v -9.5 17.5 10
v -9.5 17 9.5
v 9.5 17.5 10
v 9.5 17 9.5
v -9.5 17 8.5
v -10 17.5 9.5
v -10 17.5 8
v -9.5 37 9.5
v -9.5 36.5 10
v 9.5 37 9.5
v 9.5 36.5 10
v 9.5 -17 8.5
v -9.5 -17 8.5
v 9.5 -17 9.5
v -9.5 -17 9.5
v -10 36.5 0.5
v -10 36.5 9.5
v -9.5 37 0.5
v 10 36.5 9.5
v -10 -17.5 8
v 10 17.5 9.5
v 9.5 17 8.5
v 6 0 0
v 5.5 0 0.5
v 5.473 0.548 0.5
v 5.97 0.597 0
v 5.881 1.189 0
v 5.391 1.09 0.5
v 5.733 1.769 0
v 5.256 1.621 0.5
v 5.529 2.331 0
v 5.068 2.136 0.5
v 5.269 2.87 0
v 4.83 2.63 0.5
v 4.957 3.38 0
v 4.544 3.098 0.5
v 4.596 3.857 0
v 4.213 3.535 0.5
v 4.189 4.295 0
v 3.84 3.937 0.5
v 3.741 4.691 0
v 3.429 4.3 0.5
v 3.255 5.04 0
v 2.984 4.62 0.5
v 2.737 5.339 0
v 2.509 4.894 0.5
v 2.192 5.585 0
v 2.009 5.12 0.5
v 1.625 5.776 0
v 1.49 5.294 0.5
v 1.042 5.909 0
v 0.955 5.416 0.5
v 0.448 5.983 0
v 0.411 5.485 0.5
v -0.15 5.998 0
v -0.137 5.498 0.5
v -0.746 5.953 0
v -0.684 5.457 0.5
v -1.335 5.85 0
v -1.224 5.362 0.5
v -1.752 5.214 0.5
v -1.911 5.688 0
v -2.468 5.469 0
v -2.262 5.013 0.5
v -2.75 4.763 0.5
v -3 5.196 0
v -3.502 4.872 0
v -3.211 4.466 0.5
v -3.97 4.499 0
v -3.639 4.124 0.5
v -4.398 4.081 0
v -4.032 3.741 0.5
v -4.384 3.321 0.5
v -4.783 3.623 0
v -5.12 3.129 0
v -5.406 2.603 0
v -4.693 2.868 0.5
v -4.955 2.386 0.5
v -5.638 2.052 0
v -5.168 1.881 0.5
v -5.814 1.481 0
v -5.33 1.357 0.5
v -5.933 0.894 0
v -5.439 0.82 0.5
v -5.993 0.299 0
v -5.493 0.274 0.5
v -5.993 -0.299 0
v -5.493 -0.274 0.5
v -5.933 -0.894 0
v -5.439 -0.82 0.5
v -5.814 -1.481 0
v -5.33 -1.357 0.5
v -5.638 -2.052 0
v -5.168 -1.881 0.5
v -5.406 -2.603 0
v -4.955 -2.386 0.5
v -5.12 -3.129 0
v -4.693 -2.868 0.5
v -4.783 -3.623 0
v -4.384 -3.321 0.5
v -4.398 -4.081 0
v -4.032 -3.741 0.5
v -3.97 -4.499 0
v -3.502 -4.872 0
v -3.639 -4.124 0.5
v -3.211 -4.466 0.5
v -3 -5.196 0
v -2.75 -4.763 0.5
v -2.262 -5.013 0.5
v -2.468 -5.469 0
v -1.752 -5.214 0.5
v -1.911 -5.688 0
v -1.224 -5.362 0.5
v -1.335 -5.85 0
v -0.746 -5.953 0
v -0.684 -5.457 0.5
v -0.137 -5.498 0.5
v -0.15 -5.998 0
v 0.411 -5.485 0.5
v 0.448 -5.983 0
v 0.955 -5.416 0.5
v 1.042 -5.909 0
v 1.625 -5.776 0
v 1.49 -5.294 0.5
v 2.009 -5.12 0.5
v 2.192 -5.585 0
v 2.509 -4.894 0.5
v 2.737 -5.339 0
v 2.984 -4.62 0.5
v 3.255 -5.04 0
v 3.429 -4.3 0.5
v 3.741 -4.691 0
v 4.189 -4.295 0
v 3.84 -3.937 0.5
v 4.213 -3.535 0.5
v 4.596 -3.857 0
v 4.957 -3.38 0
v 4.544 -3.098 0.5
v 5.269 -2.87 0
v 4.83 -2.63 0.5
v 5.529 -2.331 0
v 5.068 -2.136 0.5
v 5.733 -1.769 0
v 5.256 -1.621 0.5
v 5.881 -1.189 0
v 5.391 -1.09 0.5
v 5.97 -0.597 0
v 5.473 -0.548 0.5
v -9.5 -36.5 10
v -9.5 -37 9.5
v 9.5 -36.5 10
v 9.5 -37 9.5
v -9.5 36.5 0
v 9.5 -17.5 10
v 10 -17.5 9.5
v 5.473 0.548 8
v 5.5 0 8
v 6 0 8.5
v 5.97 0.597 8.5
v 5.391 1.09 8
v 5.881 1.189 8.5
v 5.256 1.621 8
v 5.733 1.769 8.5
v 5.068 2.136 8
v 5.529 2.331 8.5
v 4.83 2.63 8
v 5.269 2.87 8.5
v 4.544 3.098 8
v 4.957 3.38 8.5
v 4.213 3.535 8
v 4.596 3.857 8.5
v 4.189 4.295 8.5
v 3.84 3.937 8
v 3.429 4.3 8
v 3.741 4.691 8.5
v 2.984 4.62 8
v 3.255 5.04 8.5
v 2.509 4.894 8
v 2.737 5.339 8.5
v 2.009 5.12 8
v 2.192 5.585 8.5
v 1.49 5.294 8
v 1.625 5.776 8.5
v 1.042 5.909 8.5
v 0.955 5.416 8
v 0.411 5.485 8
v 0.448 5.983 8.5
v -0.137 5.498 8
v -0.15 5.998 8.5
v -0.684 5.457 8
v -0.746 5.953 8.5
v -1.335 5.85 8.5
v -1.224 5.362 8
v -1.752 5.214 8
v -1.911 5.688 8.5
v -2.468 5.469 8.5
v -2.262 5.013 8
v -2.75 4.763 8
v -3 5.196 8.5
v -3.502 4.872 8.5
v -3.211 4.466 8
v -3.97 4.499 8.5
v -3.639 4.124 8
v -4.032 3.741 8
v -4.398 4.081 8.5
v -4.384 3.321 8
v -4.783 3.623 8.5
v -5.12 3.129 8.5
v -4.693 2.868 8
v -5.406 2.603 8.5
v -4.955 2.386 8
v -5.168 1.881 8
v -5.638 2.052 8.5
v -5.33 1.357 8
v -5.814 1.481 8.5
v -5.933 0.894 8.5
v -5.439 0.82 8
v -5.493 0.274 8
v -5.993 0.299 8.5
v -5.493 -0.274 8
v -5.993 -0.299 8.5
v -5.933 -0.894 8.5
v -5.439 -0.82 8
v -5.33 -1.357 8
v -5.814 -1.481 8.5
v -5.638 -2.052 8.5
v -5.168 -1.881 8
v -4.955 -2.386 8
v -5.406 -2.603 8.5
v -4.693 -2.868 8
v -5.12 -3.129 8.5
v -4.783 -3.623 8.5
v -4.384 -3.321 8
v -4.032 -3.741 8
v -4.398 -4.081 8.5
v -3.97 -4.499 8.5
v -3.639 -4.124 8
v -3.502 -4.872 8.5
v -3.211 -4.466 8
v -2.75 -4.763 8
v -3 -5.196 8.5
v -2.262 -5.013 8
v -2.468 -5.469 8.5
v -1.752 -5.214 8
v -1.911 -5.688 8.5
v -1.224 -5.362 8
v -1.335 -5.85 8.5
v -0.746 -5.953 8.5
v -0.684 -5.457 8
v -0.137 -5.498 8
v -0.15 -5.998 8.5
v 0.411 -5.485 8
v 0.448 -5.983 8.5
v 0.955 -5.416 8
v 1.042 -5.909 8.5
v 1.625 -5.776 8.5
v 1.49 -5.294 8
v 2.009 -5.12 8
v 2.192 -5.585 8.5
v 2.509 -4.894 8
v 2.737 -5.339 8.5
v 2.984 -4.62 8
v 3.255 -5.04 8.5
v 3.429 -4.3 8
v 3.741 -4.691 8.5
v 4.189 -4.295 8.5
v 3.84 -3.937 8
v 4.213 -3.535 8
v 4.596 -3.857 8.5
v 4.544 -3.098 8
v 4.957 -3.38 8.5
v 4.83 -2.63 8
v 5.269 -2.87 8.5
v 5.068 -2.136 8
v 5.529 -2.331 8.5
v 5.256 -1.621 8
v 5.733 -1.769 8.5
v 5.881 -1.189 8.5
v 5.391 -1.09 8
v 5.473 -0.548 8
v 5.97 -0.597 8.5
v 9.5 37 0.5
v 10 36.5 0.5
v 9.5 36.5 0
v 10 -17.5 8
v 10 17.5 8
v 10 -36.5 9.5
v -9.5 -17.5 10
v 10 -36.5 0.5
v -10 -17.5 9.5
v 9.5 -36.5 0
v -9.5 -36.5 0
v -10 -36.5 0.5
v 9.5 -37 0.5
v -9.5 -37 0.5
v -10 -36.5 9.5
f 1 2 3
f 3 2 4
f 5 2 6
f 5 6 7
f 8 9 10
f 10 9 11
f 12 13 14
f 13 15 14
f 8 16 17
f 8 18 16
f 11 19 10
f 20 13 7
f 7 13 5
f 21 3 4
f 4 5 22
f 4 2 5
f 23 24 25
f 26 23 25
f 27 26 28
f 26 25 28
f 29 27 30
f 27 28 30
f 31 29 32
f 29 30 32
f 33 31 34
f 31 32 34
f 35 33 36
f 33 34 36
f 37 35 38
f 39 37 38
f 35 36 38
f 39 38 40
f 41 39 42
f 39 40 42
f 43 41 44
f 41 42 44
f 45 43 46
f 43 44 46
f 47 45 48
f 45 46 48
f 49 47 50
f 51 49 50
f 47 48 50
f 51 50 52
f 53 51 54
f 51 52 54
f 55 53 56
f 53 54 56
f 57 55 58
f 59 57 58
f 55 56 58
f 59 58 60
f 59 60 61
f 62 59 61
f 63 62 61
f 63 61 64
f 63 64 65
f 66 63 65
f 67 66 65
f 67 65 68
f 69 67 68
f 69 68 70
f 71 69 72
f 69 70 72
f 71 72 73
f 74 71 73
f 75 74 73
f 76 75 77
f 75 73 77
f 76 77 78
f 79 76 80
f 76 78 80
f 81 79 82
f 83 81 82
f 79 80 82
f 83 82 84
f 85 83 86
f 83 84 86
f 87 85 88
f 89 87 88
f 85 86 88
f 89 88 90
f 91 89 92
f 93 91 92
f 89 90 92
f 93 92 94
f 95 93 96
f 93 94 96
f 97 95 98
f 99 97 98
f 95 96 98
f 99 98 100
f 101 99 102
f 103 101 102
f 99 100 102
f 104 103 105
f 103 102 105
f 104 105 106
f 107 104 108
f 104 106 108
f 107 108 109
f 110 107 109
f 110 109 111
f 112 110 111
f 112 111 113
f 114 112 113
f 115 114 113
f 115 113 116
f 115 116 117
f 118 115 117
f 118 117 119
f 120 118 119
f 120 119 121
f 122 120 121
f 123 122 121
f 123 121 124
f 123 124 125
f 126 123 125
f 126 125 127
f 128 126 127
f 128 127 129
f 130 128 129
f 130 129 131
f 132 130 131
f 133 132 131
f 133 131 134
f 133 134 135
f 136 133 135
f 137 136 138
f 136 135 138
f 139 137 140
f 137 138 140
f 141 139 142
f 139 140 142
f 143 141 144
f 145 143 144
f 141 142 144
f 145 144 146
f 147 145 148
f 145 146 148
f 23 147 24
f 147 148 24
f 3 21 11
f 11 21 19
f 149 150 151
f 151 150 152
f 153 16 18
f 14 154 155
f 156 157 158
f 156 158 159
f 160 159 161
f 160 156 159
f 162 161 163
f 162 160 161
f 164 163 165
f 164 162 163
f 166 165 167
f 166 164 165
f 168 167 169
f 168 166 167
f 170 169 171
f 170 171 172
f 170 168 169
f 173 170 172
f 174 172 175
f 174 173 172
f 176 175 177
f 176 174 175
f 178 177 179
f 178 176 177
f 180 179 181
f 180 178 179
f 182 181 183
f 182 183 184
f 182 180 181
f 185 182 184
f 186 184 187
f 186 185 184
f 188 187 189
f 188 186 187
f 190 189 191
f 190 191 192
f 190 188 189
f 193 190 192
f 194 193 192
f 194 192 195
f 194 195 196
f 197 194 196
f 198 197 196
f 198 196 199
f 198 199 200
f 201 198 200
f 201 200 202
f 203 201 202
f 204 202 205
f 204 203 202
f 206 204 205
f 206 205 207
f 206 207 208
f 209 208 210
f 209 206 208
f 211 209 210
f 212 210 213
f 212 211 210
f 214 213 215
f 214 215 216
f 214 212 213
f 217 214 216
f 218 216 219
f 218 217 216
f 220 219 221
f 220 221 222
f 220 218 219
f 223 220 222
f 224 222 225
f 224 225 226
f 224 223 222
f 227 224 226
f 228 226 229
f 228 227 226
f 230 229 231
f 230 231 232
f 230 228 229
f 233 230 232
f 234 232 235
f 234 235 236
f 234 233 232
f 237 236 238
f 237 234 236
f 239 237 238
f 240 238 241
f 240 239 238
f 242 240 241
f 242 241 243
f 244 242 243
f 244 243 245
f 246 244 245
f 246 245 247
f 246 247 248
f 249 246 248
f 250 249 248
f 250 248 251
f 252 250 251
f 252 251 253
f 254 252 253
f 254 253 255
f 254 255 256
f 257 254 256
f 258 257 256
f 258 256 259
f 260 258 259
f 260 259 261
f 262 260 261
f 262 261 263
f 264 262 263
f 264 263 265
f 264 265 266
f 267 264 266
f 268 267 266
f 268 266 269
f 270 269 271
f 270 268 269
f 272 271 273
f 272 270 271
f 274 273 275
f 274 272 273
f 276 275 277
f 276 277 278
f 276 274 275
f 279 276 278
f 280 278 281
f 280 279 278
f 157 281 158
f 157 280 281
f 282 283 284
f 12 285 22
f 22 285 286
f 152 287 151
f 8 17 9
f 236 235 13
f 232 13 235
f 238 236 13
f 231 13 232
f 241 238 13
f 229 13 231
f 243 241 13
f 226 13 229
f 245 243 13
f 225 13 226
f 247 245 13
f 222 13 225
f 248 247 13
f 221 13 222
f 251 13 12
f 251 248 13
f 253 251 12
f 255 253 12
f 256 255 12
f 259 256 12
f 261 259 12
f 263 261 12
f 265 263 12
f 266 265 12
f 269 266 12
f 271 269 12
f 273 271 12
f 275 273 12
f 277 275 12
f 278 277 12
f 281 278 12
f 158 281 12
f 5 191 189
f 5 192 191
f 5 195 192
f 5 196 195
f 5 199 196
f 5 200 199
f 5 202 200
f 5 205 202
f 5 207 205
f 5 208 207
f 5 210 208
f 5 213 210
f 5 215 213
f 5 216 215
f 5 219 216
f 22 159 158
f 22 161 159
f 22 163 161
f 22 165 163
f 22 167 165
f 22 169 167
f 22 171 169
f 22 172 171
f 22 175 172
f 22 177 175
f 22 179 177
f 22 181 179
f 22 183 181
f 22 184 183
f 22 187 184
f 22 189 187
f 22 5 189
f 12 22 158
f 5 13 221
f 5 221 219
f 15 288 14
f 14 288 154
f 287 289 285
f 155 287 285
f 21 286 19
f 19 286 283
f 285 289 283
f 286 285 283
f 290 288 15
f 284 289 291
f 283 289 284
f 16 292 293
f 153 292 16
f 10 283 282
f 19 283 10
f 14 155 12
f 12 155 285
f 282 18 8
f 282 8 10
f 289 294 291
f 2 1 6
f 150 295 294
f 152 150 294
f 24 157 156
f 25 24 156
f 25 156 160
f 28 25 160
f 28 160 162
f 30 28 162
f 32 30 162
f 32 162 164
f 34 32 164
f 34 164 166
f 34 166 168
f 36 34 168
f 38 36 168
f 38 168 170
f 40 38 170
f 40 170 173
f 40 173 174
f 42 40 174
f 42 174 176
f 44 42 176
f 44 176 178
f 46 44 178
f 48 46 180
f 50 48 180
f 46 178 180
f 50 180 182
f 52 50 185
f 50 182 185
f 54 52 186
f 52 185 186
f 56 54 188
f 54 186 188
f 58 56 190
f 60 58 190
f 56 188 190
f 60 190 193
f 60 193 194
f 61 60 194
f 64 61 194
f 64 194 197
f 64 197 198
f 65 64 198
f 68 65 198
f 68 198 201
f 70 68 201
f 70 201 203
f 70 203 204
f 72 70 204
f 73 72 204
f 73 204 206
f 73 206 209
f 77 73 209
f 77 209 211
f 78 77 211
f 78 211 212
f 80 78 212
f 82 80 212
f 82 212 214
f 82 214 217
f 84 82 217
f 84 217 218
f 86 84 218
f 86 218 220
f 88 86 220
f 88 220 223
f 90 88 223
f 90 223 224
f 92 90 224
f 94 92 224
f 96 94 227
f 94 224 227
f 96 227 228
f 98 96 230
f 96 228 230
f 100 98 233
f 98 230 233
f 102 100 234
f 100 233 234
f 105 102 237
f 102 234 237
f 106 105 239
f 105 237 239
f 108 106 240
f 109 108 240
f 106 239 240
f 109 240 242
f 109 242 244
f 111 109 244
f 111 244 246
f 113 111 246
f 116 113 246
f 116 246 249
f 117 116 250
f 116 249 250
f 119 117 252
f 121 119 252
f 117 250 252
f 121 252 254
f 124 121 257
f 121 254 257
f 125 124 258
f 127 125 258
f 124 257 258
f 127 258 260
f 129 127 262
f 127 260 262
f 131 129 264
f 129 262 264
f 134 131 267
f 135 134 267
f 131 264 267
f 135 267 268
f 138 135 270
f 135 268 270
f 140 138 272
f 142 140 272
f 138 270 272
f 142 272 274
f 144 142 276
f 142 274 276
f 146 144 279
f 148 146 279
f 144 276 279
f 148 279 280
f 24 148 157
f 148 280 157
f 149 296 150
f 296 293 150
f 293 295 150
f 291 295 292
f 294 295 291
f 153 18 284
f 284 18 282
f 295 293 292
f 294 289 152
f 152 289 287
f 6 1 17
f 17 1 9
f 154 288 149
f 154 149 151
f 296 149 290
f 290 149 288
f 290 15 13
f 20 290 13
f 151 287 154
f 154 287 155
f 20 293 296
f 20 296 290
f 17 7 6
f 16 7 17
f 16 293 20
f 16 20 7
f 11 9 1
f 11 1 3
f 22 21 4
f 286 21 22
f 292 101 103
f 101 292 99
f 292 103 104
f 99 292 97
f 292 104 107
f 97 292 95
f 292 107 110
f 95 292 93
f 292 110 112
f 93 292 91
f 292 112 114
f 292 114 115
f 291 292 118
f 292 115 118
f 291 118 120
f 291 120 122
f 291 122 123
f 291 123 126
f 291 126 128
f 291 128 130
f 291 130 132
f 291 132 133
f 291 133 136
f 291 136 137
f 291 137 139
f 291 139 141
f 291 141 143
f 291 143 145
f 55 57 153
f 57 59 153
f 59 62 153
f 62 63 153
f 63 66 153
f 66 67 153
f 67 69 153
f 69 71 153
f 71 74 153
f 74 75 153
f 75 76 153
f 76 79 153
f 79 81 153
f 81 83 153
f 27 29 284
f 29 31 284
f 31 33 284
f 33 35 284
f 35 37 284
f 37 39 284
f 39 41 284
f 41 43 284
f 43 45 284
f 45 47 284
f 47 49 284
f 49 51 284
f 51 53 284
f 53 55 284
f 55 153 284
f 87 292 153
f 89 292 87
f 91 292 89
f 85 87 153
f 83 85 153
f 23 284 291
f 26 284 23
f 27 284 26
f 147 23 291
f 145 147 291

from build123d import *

# Parameters (mm, degrees)
F0_W     = 20
F0_H     = 74
F1_DEPTH = 10
F2_W     = 20
F2_H     = 34
F3_DEPTH = 1.5
F4_R     = 5.5
F5_DEPTH = 8.501
F6_SIZE  = 0.5


with BuildPart() as f1:
    # F0 (on Top) → F1 (new body)
    with BuildSketch(Plane.XY):
        Rectangle(F0_W, F0_H)
    extrude(amount=F1_DEPTH)

    # F2 (on face) → F3 (cut)
    with BuildSketch(Plane.XY.offset(10)):
        Rectangle(F2_W, F2_H)
    extrude(amount=-F3_DEPTH, mode=Mode.SUBTRACT)

    # F4 (on face) → F5 (cut, through all)
    with BuildSketch(Plane.XY.offset(8.5)):
        Circle(F4_R)
    extrude(amount=-F5_DEPTH, mode=Mode.SUBTRACT)

    # F6
    f6_edges = [f1.edges().sort_by_distance(p)[0] for p in [
        (-5.5, 0, 8.5),
        (10, -37, 5),
        (-10, -37, 5),
        (10, 37, 5),
        (-10, 37, 5),
        (-10, 0, 0),
        (0, -37, 0),
        (10, 0, 0),
        (0, 37, 0),
        (10, 27, 10),
        (-10, 27, 10),
        (-10, -27, 10),
        (10, -27, 10),
        (10, 0, 8.5),
        (-10, 0, 8.5),
        (0, 37, 10),
        (0, -37, 10),
        (-5.5, 0, 0),
        (0, 17, 10),
        (0, -17, 10),
        (-10, -17, 9.25),
        (-10, 17, 9.25),
        (10, 17, 9.25),
        (10, -17, 9.25),
    ]]
    chamfer(f6_edges, length=F6_SIZE)


solid = f1.part
